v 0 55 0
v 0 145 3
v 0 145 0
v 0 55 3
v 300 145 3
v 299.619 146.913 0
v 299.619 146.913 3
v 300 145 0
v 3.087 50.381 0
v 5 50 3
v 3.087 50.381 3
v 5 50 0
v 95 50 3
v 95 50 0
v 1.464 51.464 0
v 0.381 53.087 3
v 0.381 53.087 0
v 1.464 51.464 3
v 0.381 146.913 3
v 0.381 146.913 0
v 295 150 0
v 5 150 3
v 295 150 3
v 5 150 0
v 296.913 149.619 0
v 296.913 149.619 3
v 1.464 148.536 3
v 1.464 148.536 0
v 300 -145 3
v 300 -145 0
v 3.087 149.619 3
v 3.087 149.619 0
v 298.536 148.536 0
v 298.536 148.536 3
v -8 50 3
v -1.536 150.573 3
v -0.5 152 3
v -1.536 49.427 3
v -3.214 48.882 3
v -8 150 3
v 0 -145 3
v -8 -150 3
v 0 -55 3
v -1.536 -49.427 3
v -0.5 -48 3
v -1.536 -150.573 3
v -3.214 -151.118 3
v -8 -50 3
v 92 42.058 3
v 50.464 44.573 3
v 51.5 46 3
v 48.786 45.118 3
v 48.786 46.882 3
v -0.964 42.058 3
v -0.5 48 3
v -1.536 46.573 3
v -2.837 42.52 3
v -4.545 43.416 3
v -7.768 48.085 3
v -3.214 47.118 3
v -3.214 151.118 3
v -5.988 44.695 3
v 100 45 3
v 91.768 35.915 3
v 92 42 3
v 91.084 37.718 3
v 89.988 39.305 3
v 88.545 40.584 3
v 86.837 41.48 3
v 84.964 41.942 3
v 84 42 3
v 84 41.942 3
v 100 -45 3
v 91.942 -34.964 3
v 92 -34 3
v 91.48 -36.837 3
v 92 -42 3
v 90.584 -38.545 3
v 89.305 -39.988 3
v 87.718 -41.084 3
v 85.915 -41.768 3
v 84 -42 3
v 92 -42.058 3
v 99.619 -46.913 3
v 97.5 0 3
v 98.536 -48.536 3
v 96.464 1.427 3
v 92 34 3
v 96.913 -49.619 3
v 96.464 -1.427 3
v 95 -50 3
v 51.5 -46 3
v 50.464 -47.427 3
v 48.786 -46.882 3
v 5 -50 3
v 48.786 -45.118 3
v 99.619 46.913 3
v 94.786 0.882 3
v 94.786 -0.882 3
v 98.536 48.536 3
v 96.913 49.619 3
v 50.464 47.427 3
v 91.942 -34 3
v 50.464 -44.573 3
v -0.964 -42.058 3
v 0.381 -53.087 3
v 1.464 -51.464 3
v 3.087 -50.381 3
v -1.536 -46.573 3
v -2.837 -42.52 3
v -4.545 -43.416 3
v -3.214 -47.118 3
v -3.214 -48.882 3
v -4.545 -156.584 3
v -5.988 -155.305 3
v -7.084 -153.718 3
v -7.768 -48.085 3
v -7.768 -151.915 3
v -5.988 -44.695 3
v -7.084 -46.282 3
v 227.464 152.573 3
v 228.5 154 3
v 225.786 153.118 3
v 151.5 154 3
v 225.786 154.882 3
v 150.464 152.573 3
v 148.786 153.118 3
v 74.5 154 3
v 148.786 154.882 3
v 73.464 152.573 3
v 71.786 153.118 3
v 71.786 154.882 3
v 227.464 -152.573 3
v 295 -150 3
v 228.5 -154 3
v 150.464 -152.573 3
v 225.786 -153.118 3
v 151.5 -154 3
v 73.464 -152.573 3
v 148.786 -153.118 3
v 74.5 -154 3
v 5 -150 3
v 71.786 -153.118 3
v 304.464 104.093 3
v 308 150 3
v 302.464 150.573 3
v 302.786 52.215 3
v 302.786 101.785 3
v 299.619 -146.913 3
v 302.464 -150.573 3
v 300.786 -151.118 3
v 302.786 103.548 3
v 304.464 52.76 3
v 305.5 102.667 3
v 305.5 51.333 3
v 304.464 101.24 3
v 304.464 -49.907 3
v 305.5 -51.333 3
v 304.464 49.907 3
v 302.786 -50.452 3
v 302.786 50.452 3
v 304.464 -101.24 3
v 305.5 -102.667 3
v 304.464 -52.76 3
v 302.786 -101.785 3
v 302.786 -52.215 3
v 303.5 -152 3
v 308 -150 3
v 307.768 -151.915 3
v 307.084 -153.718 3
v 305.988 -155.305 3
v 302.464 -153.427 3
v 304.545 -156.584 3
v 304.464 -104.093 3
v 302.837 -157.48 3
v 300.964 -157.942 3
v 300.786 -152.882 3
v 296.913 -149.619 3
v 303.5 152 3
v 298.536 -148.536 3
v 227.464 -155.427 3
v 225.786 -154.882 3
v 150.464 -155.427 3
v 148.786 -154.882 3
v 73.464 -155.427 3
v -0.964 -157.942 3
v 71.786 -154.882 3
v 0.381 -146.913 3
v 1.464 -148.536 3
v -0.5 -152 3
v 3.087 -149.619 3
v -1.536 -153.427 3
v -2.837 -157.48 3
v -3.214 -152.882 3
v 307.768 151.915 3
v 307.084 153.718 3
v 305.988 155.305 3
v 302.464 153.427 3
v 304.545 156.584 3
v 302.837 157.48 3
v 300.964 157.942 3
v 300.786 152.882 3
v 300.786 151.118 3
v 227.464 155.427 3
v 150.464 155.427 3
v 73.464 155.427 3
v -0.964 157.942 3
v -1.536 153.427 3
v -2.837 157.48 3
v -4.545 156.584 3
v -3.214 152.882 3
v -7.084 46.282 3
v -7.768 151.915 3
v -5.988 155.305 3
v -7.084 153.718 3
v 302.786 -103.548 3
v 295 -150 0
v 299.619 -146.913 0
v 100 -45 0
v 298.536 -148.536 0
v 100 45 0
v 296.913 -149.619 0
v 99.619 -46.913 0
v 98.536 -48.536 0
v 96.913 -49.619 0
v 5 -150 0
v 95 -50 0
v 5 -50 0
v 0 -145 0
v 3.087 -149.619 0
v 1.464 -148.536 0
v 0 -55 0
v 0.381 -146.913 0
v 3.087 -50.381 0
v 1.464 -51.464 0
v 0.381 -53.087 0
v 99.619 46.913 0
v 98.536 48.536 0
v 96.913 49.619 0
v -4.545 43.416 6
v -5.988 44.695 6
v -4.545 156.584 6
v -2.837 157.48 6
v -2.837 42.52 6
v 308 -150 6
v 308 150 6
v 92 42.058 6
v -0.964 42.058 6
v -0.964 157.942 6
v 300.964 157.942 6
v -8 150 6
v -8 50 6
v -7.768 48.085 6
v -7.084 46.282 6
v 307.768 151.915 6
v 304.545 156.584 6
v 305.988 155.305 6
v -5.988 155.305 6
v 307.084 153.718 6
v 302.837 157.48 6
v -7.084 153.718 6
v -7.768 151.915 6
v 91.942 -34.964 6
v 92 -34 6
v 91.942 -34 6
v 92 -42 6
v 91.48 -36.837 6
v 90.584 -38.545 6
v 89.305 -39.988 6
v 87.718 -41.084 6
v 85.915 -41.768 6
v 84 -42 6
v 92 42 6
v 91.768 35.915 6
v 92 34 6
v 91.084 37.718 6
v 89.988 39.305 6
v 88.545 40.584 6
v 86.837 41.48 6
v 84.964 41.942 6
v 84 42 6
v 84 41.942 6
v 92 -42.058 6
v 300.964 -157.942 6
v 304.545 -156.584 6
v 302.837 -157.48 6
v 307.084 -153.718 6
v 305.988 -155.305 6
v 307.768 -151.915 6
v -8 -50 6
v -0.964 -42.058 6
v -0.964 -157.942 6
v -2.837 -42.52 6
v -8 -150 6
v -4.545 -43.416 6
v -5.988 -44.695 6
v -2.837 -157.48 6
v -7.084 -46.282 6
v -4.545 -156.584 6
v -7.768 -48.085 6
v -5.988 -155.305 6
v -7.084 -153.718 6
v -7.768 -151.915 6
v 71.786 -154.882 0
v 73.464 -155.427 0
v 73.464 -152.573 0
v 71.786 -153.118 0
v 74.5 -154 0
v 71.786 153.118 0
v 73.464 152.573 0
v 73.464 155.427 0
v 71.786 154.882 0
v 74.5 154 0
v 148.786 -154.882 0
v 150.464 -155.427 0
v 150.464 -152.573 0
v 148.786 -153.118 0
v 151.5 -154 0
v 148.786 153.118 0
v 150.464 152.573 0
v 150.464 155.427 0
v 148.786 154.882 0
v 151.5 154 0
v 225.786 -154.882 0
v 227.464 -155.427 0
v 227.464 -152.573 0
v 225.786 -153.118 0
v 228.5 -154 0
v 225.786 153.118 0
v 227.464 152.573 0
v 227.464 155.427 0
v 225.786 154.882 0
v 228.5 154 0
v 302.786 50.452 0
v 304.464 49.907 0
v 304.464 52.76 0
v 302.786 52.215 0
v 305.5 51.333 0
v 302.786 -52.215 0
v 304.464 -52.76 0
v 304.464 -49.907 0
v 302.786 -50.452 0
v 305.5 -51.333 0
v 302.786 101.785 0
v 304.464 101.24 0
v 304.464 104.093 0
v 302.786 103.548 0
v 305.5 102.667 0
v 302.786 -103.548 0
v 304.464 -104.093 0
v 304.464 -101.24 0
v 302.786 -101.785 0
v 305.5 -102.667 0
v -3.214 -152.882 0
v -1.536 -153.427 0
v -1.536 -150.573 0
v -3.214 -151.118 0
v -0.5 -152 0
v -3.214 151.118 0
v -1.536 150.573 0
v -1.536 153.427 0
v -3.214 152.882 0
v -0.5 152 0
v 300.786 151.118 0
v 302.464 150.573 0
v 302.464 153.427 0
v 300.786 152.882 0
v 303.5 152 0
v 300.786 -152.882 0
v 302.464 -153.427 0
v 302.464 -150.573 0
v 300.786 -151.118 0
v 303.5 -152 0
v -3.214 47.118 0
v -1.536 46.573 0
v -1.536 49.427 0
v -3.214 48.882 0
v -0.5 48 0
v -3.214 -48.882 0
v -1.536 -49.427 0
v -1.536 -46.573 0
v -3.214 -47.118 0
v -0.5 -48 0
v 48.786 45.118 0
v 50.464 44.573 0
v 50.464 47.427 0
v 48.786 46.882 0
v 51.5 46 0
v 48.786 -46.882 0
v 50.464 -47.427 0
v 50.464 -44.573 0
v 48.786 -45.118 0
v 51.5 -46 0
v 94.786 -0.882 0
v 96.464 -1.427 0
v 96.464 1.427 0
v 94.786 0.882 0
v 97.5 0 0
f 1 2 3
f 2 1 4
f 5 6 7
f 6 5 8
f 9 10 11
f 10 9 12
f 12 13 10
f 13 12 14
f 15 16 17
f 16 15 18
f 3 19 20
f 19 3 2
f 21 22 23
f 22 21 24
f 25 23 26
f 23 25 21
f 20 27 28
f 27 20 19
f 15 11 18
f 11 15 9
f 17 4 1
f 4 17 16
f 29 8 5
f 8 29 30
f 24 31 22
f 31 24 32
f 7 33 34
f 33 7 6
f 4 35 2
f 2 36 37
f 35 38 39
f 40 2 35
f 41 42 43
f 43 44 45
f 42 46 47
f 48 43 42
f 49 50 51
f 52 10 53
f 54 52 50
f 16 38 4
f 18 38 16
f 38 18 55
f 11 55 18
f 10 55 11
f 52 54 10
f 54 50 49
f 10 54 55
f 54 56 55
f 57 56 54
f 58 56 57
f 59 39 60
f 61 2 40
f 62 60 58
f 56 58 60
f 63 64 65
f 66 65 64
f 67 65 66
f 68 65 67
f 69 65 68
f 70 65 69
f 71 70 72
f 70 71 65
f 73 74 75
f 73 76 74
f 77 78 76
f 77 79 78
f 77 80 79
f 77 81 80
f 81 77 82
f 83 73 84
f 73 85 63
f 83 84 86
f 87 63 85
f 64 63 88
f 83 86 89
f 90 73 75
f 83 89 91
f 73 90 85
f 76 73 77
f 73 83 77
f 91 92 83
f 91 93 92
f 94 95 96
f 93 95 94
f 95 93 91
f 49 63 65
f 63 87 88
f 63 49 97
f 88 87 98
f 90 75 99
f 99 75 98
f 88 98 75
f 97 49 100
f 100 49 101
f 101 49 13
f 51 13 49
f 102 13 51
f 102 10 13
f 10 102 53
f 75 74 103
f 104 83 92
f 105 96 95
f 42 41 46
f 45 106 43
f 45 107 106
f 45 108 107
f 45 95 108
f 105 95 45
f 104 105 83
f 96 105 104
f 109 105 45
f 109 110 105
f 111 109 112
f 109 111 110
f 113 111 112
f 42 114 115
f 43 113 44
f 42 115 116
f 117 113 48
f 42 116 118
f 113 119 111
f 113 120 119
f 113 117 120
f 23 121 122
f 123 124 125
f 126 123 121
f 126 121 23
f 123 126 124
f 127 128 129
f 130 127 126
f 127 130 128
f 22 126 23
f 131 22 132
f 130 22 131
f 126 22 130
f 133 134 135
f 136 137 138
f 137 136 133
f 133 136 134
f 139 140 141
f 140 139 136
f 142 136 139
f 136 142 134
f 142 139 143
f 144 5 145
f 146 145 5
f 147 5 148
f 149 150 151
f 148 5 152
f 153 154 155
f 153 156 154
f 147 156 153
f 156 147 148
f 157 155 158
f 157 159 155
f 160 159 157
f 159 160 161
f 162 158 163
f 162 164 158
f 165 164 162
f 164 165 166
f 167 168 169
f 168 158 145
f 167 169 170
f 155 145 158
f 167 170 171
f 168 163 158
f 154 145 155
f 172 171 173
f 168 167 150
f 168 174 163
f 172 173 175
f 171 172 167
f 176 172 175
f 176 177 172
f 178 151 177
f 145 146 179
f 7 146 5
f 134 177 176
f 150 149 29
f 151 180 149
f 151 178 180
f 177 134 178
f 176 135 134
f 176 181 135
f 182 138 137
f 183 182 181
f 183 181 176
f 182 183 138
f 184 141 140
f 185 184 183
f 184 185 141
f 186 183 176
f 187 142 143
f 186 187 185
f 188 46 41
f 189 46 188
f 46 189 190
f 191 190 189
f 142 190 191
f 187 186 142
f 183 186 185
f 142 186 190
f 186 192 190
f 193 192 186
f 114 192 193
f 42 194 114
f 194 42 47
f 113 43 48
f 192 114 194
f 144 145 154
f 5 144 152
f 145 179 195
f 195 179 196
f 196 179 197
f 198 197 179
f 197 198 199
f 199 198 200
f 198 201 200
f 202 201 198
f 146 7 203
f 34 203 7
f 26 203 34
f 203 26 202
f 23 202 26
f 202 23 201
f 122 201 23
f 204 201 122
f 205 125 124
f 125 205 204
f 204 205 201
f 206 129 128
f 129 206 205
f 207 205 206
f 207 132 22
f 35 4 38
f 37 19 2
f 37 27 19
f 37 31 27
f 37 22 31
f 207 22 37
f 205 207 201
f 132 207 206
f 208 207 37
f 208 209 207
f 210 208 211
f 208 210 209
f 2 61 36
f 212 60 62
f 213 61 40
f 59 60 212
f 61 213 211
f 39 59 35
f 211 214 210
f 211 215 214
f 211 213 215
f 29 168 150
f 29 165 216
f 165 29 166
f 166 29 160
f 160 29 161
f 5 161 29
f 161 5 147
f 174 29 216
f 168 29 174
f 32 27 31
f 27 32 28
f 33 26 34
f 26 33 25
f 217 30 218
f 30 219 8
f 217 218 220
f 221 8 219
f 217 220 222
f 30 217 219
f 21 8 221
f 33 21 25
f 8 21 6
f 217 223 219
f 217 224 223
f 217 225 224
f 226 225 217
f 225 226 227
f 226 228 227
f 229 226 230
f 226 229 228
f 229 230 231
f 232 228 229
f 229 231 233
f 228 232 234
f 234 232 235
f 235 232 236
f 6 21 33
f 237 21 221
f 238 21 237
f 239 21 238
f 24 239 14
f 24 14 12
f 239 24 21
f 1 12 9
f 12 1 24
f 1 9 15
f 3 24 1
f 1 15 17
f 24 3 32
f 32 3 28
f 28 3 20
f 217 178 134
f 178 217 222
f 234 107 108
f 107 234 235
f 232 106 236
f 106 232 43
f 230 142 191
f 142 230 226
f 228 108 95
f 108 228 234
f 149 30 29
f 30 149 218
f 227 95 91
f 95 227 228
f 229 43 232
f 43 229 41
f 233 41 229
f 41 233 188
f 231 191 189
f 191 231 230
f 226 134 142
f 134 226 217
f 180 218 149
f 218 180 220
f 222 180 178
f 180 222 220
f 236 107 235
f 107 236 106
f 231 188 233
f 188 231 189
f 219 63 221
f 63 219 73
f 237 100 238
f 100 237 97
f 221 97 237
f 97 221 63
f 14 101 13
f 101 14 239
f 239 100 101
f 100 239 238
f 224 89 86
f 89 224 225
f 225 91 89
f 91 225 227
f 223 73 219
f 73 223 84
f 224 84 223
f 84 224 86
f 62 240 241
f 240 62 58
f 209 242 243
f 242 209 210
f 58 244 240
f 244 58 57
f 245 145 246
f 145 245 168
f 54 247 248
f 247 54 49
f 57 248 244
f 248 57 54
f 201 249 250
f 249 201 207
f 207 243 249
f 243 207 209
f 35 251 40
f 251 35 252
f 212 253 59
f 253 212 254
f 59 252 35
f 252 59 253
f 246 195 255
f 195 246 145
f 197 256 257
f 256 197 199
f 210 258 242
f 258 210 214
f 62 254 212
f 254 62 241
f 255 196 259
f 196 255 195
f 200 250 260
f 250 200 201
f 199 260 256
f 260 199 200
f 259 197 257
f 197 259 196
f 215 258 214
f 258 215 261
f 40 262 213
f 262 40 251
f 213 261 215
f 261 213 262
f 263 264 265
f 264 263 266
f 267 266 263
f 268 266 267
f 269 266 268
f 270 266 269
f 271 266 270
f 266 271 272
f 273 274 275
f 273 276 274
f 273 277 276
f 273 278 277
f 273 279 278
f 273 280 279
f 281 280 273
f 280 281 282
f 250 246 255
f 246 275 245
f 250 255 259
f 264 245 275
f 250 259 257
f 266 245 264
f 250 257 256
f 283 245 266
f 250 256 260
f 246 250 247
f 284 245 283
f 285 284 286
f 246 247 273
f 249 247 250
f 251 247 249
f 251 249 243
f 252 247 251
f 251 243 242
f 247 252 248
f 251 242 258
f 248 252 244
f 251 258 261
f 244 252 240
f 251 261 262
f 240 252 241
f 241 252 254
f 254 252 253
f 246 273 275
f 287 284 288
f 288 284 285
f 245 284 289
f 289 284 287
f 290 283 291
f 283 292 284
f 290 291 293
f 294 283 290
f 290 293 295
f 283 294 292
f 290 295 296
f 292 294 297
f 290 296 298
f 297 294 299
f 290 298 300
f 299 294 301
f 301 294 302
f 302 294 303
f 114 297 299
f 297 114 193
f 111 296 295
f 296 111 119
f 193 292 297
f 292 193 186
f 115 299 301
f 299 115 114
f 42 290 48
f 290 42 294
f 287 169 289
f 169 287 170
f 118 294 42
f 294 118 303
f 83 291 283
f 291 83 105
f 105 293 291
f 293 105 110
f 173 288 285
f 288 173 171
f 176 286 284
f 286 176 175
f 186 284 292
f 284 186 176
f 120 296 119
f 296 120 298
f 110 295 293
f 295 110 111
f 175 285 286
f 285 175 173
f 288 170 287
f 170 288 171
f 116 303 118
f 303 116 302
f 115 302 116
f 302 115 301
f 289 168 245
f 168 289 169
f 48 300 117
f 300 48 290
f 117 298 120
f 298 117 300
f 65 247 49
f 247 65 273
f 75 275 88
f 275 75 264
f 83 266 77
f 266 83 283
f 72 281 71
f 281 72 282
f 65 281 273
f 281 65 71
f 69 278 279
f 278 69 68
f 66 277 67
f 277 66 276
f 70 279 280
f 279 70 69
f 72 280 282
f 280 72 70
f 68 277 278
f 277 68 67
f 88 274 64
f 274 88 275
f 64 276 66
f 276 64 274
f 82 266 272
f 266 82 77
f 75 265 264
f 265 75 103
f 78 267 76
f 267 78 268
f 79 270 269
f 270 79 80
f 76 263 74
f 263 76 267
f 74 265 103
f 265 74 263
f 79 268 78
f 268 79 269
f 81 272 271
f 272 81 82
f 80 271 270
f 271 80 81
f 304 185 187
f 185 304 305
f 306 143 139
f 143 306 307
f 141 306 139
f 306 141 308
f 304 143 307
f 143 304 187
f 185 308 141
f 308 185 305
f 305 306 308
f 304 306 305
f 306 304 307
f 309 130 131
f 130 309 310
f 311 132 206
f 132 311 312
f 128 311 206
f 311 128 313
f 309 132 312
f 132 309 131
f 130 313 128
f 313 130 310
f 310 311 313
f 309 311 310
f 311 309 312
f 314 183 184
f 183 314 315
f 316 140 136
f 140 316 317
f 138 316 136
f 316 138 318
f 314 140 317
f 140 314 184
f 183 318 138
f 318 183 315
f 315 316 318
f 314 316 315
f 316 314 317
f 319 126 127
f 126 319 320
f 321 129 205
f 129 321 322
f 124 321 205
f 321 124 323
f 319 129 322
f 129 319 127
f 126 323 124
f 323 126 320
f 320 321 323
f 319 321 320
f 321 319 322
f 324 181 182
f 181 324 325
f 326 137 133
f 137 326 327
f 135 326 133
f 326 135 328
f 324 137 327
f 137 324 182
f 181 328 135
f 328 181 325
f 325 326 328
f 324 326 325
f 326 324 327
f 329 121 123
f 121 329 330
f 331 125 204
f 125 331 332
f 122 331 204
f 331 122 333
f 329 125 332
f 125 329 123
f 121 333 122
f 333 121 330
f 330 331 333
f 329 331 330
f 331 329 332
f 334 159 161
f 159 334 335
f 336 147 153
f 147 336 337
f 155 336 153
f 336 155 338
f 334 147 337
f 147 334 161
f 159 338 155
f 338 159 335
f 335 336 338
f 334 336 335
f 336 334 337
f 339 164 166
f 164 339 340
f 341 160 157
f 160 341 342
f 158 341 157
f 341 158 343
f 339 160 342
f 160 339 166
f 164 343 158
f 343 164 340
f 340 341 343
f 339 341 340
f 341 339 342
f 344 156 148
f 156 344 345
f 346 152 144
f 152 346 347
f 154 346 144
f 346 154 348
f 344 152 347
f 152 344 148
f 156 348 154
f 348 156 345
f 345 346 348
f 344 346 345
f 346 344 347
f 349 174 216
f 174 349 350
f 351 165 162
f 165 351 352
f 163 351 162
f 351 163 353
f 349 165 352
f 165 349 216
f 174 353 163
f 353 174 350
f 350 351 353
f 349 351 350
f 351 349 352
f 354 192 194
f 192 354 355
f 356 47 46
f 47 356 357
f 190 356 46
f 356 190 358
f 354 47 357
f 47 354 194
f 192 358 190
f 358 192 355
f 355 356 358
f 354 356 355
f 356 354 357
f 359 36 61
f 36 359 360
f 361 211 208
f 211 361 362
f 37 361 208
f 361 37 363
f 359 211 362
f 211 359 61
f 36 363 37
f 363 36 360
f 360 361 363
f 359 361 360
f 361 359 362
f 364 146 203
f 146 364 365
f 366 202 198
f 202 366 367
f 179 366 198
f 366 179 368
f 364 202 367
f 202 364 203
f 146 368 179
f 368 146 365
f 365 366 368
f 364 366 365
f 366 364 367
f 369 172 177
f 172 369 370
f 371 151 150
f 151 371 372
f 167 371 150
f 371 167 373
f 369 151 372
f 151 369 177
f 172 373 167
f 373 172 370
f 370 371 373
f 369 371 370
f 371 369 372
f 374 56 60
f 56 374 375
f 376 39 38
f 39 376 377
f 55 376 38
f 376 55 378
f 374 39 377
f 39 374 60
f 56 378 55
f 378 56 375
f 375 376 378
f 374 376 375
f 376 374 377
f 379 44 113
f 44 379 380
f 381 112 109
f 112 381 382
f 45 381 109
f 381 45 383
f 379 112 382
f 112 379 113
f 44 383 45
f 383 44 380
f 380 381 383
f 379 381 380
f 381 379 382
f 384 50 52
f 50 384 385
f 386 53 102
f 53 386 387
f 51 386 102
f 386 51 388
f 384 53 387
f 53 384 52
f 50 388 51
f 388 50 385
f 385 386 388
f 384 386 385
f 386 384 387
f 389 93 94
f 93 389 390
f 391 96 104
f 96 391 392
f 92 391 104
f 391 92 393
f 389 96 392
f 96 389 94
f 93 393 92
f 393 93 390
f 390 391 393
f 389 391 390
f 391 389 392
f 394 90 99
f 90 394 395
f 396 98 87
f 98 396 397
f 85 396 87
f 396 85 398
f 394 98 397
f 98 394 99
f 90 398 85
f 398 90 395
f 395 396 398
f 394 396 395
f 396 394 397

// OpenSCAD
// file: door-servo-measurements.scad
//boxSize=[640, 300, 500];
boxSize=[280, 150, 220];
boxWallThickness=4;

perspexBorderSize=8;

doorWoodBorder=10;
doorWoodHingeBorder=50;
doorWoodBorderRadius=2;
doorWoodThickness=16;
acsButtonM=20.2;
acsLargeModuleSize=[50.12, 65.47];
acsNfcModuleSize=[40,40];
acsModuleBorder=0.1;
acsLidWidth=110;

nfcLogoSize=[28.753704,28.782331];

strokeSize=20;
clipSize=20;
clipWall=5;
doorWall=3;
doorClipGap=3;
boltM=3;
smallBoltM=2;
boltHeadM=5;
boltNutM=5.9;
boltHeadHeight=3;
lockBoltCurveR=1.5;

cabinetHingeDoorBoltOffsetHeight=48/2;
cabinetHingeDoorBoltOffsetLength=7;
cabinetHingeDoorMetalThickness=0.8;
cabinetHingeDoorInsetM=35;
cabinetHingeDoorInsetDepth=12;
cabinetHingeDoorInsetFace=2.5;
cabinetHingeDoorInsetWidth=25.5;
cabinetHingeDoorInsetLengthOffset=3;
cabinetHingeDoorInsetOuterRadius=4;
cabinetHingeDoorBoltChamferM=8;

cabinetHingeFrameBoltOffsetHeight=16;
cabinetHingeFrameBoltOffsetDepth=25;
cabinetHingeFrameSize=[27,46, 16];
cabinetHingeFrameInsetFace = 2.8;
cabinetHingeFrameCornerRadius = 4;
cabinetHingeFrameHoleOne=6;
cabinetHingeFrameHoleTwoExtraOffset = 14;
cabinetHingeFrameHoleTwo=cabinetHingeFrameHoleOne + cabinetHingeFrameHoleTwoExtraOffset;
cabinetHingeFrameLargeChamferSize=[8,12];

cabinetHingeDoorPlate=[19.3,60];

boltPlate = boltM * 3;

gapToMove = 0.25;
gapToFit = 0.1;
doorSize=[200,150];
doorLatchPannel=3 * boltM;

servoHeight = 22.5;
servoDrivePlateHeight = 4;
servoSpindleHeight = 3;
servoSpindleOffset = 5.5;
servoWidth = 12.2;
servoLength = 23;
servoArmM=10;
servoSpindleM=4.8;

servoMountPlateLength=32.2;
servoMountPlateOffset=16.75;
servoMountPlateThickness=2;
servoMountPlateExtends = (servoMountPlateLength - servoLength) / 2;
servoMountHoleOffset = 2;
servoMountHoleM = 2;

switchThickness = 9.7;
switchCornerR=4;
switchHoleM=3;
switchLength=27.9;
switchWidth=15.96;
switchRollerOut=9;
switchRollerIn=6.5;
switchRollerM=4.6;
switchRollerTopOffset=3.3;
switchRollerThickness = switchThickness - 2 * 2.5;

leaverSwitchThickness=6.36;
leaverSwitchWidth=9.92;
leaverSwitchLength=20.15;
leaverSwitchCornerR=1;
leaverOffset=3;
leaverExtension=11.5;
leaverThickness = 1;
leaverWidth=4.28;
leaverSwitchContactLength=5;
leaverSwitchContactOffset=1.5;

thinWall=1;
ferrousSheet=1;
magnetM=5;

initialAngle = 20;
deltaAngle = 66.5;

bleepHolesOffset=110-56;

handleDepth=45;
handleWall=2;
// main file
include <door-servo-measurements.scad>

module windowWithPeninsula(oceanSize=[300,300], peninsularSize=[100, 100], thickness = 3, cornerRadius = 5) {
    union() {
        minkowski() { 
            difference() {
                translate([cornerRadius,-(oceanSize[1] - (2 * cornerRadius)) / 2,0]) {
                    cube([oceanSize[0] - (2 * cornerRadius), oceanSize[1] - (2 * cornerRadius), thickness - 1]);
                }
                translate([cornerRadius, -(peninsularSize[1] + 2 * cornerRadius) / 2, -0.01]) {
                    cube([peninsularSize[0], peninsularSize[1] + 2 * cornerRadius, thickness + 0.02]);
                }
            }
            cylinder(r=cornerRadius,h=1);
        }

        translate([peninsularSize[0] - cornerRadius, peninsularSize[1]/2 - cornerRadius,0]){
            cornerRoundCut(r=cornerRadius,h=thickness);
        }
        translate([peninsularSize[0] - cornerRadius, -peninsularSize[1]/2 + cornerRadius,0]){
            rotate([0,0,-90]) {
                cornerRoundCut(r=cornerRadius,h=thickness);
            }
        }
    }
    *color("blue") translate([0,0,0]) {
        difference() {
            translate([0,-oceanSize[1] / 2,0]) {
                cube([oceanSize[0], oceanSize[1], thickness]);
            }
            translate([0, -peninsularSize[1] / 2, -0.01]) {
                cube([peninsularSize[0], peninsularSize[1], thickness + 0.02]);
            }
        }
    }
}

module cornerRoundCut(r=5,h=10) {
    difference() {
        cube([r, r, h]); 
        translate([0,0,-0.01]){
            cylinder(r=r,h=h + 0.02);
        }
    }
}

windowWithPeninsula();

translate([-8, 0, 3]) {
    color("blue") windowWithPeninsula([316,316], [100,84], 3, 8);
}

windowWithPeninsulaHoles();

module windowWithPeninsulaHoles(oceanSize=[300,300], peninsularSize=[100, 100], borderSize=8, boltM=3, thickness=6) {
    oceanSizeBorder = [oceanSize[0] + borderSize, oceanSize[1] + borderSize];
    translate([-borderSize / 2, 0, 0]) {
        for(i=[1:3]) {
            translate([i * oceanSizeBorder[0] / 4, -oceanSizeBorder[1] / 2, 0]) {
                cylinder(r=boltM/2,h=thickness);
            }
            translate([i * oceanSizeBorder[0] / 4, oceanSizeBorder[1] / 2, 0]) {
                cylinder(r=boltM/2,h=thickness);
            }
        }
    }

    translate([oceanSize[0] + borderSize / 2, 0, 0]) {
        for(i=[1:2]) {
            translate([0, i * oceanSizeBorder[1] / 6, 0]) {
                cylinder(r=boltM/2,h=thickness);
            }
            translate([0, -i * oceanSizeBorder[1] / 6, 0]) {
                cylinder(r=boltM/2,h=thickness);
            }
        }
    }

    // Corner holes

    cornerOffset = sqrt(borderSize/2);
    translate([-cornerOffset, -oceanSize[1]/2 - cornerOffset, 0]) {
        cylinder(r=boltM/2,h=thickness);
    }

    translate([-cornerOffset, oceanSize[1]/2 + cornerOffset, 0]) {
        cylinder(r=boltM/2,h=thickness);
    }

    translate([oceanSize[0] + cornerOffset, oceanSize[1]/2 + cornerOffset, 0]) {
        cylinder(r=boltM/2,h=thickness);
    }
    
    translate([oceanSize[0] + cornerOffset, -oceanSize[1]/2 - cornerOffset, 0]) {
        cylinder(r=boltM/2,h=thickness);
    }

    // Peninsular holes

    translate([-cornerOffset, peninsularSize[1] / 2 - cornerOffset, 0]) {
        cylinder(r=boltM/2,h=thickness);
    }

    translate([-cornerOffset, -peninsularSize[1] / 2 + cornerOffset, 0]) {
        cylinder(r=boltM/2,h=thickness);
    }

    translate([peninsularSize[0] / 2, peninsularSize[1] / 2 - borderSize / 2, 0]) {
        cylinder(r=boltM/2,h=thickness);
    }

    translate([peninsularSize[0] / 2, -peninsularSize[1] / 2 + borderSize / 2, 0]) {
        cylinder(r=boltM/2,h=thickness);
    }

    translate([peninsularSize[0] - borderSize / 2, 0, 0]) {
        cylinder(r=boltM/2,h=thickness);
    }
}
